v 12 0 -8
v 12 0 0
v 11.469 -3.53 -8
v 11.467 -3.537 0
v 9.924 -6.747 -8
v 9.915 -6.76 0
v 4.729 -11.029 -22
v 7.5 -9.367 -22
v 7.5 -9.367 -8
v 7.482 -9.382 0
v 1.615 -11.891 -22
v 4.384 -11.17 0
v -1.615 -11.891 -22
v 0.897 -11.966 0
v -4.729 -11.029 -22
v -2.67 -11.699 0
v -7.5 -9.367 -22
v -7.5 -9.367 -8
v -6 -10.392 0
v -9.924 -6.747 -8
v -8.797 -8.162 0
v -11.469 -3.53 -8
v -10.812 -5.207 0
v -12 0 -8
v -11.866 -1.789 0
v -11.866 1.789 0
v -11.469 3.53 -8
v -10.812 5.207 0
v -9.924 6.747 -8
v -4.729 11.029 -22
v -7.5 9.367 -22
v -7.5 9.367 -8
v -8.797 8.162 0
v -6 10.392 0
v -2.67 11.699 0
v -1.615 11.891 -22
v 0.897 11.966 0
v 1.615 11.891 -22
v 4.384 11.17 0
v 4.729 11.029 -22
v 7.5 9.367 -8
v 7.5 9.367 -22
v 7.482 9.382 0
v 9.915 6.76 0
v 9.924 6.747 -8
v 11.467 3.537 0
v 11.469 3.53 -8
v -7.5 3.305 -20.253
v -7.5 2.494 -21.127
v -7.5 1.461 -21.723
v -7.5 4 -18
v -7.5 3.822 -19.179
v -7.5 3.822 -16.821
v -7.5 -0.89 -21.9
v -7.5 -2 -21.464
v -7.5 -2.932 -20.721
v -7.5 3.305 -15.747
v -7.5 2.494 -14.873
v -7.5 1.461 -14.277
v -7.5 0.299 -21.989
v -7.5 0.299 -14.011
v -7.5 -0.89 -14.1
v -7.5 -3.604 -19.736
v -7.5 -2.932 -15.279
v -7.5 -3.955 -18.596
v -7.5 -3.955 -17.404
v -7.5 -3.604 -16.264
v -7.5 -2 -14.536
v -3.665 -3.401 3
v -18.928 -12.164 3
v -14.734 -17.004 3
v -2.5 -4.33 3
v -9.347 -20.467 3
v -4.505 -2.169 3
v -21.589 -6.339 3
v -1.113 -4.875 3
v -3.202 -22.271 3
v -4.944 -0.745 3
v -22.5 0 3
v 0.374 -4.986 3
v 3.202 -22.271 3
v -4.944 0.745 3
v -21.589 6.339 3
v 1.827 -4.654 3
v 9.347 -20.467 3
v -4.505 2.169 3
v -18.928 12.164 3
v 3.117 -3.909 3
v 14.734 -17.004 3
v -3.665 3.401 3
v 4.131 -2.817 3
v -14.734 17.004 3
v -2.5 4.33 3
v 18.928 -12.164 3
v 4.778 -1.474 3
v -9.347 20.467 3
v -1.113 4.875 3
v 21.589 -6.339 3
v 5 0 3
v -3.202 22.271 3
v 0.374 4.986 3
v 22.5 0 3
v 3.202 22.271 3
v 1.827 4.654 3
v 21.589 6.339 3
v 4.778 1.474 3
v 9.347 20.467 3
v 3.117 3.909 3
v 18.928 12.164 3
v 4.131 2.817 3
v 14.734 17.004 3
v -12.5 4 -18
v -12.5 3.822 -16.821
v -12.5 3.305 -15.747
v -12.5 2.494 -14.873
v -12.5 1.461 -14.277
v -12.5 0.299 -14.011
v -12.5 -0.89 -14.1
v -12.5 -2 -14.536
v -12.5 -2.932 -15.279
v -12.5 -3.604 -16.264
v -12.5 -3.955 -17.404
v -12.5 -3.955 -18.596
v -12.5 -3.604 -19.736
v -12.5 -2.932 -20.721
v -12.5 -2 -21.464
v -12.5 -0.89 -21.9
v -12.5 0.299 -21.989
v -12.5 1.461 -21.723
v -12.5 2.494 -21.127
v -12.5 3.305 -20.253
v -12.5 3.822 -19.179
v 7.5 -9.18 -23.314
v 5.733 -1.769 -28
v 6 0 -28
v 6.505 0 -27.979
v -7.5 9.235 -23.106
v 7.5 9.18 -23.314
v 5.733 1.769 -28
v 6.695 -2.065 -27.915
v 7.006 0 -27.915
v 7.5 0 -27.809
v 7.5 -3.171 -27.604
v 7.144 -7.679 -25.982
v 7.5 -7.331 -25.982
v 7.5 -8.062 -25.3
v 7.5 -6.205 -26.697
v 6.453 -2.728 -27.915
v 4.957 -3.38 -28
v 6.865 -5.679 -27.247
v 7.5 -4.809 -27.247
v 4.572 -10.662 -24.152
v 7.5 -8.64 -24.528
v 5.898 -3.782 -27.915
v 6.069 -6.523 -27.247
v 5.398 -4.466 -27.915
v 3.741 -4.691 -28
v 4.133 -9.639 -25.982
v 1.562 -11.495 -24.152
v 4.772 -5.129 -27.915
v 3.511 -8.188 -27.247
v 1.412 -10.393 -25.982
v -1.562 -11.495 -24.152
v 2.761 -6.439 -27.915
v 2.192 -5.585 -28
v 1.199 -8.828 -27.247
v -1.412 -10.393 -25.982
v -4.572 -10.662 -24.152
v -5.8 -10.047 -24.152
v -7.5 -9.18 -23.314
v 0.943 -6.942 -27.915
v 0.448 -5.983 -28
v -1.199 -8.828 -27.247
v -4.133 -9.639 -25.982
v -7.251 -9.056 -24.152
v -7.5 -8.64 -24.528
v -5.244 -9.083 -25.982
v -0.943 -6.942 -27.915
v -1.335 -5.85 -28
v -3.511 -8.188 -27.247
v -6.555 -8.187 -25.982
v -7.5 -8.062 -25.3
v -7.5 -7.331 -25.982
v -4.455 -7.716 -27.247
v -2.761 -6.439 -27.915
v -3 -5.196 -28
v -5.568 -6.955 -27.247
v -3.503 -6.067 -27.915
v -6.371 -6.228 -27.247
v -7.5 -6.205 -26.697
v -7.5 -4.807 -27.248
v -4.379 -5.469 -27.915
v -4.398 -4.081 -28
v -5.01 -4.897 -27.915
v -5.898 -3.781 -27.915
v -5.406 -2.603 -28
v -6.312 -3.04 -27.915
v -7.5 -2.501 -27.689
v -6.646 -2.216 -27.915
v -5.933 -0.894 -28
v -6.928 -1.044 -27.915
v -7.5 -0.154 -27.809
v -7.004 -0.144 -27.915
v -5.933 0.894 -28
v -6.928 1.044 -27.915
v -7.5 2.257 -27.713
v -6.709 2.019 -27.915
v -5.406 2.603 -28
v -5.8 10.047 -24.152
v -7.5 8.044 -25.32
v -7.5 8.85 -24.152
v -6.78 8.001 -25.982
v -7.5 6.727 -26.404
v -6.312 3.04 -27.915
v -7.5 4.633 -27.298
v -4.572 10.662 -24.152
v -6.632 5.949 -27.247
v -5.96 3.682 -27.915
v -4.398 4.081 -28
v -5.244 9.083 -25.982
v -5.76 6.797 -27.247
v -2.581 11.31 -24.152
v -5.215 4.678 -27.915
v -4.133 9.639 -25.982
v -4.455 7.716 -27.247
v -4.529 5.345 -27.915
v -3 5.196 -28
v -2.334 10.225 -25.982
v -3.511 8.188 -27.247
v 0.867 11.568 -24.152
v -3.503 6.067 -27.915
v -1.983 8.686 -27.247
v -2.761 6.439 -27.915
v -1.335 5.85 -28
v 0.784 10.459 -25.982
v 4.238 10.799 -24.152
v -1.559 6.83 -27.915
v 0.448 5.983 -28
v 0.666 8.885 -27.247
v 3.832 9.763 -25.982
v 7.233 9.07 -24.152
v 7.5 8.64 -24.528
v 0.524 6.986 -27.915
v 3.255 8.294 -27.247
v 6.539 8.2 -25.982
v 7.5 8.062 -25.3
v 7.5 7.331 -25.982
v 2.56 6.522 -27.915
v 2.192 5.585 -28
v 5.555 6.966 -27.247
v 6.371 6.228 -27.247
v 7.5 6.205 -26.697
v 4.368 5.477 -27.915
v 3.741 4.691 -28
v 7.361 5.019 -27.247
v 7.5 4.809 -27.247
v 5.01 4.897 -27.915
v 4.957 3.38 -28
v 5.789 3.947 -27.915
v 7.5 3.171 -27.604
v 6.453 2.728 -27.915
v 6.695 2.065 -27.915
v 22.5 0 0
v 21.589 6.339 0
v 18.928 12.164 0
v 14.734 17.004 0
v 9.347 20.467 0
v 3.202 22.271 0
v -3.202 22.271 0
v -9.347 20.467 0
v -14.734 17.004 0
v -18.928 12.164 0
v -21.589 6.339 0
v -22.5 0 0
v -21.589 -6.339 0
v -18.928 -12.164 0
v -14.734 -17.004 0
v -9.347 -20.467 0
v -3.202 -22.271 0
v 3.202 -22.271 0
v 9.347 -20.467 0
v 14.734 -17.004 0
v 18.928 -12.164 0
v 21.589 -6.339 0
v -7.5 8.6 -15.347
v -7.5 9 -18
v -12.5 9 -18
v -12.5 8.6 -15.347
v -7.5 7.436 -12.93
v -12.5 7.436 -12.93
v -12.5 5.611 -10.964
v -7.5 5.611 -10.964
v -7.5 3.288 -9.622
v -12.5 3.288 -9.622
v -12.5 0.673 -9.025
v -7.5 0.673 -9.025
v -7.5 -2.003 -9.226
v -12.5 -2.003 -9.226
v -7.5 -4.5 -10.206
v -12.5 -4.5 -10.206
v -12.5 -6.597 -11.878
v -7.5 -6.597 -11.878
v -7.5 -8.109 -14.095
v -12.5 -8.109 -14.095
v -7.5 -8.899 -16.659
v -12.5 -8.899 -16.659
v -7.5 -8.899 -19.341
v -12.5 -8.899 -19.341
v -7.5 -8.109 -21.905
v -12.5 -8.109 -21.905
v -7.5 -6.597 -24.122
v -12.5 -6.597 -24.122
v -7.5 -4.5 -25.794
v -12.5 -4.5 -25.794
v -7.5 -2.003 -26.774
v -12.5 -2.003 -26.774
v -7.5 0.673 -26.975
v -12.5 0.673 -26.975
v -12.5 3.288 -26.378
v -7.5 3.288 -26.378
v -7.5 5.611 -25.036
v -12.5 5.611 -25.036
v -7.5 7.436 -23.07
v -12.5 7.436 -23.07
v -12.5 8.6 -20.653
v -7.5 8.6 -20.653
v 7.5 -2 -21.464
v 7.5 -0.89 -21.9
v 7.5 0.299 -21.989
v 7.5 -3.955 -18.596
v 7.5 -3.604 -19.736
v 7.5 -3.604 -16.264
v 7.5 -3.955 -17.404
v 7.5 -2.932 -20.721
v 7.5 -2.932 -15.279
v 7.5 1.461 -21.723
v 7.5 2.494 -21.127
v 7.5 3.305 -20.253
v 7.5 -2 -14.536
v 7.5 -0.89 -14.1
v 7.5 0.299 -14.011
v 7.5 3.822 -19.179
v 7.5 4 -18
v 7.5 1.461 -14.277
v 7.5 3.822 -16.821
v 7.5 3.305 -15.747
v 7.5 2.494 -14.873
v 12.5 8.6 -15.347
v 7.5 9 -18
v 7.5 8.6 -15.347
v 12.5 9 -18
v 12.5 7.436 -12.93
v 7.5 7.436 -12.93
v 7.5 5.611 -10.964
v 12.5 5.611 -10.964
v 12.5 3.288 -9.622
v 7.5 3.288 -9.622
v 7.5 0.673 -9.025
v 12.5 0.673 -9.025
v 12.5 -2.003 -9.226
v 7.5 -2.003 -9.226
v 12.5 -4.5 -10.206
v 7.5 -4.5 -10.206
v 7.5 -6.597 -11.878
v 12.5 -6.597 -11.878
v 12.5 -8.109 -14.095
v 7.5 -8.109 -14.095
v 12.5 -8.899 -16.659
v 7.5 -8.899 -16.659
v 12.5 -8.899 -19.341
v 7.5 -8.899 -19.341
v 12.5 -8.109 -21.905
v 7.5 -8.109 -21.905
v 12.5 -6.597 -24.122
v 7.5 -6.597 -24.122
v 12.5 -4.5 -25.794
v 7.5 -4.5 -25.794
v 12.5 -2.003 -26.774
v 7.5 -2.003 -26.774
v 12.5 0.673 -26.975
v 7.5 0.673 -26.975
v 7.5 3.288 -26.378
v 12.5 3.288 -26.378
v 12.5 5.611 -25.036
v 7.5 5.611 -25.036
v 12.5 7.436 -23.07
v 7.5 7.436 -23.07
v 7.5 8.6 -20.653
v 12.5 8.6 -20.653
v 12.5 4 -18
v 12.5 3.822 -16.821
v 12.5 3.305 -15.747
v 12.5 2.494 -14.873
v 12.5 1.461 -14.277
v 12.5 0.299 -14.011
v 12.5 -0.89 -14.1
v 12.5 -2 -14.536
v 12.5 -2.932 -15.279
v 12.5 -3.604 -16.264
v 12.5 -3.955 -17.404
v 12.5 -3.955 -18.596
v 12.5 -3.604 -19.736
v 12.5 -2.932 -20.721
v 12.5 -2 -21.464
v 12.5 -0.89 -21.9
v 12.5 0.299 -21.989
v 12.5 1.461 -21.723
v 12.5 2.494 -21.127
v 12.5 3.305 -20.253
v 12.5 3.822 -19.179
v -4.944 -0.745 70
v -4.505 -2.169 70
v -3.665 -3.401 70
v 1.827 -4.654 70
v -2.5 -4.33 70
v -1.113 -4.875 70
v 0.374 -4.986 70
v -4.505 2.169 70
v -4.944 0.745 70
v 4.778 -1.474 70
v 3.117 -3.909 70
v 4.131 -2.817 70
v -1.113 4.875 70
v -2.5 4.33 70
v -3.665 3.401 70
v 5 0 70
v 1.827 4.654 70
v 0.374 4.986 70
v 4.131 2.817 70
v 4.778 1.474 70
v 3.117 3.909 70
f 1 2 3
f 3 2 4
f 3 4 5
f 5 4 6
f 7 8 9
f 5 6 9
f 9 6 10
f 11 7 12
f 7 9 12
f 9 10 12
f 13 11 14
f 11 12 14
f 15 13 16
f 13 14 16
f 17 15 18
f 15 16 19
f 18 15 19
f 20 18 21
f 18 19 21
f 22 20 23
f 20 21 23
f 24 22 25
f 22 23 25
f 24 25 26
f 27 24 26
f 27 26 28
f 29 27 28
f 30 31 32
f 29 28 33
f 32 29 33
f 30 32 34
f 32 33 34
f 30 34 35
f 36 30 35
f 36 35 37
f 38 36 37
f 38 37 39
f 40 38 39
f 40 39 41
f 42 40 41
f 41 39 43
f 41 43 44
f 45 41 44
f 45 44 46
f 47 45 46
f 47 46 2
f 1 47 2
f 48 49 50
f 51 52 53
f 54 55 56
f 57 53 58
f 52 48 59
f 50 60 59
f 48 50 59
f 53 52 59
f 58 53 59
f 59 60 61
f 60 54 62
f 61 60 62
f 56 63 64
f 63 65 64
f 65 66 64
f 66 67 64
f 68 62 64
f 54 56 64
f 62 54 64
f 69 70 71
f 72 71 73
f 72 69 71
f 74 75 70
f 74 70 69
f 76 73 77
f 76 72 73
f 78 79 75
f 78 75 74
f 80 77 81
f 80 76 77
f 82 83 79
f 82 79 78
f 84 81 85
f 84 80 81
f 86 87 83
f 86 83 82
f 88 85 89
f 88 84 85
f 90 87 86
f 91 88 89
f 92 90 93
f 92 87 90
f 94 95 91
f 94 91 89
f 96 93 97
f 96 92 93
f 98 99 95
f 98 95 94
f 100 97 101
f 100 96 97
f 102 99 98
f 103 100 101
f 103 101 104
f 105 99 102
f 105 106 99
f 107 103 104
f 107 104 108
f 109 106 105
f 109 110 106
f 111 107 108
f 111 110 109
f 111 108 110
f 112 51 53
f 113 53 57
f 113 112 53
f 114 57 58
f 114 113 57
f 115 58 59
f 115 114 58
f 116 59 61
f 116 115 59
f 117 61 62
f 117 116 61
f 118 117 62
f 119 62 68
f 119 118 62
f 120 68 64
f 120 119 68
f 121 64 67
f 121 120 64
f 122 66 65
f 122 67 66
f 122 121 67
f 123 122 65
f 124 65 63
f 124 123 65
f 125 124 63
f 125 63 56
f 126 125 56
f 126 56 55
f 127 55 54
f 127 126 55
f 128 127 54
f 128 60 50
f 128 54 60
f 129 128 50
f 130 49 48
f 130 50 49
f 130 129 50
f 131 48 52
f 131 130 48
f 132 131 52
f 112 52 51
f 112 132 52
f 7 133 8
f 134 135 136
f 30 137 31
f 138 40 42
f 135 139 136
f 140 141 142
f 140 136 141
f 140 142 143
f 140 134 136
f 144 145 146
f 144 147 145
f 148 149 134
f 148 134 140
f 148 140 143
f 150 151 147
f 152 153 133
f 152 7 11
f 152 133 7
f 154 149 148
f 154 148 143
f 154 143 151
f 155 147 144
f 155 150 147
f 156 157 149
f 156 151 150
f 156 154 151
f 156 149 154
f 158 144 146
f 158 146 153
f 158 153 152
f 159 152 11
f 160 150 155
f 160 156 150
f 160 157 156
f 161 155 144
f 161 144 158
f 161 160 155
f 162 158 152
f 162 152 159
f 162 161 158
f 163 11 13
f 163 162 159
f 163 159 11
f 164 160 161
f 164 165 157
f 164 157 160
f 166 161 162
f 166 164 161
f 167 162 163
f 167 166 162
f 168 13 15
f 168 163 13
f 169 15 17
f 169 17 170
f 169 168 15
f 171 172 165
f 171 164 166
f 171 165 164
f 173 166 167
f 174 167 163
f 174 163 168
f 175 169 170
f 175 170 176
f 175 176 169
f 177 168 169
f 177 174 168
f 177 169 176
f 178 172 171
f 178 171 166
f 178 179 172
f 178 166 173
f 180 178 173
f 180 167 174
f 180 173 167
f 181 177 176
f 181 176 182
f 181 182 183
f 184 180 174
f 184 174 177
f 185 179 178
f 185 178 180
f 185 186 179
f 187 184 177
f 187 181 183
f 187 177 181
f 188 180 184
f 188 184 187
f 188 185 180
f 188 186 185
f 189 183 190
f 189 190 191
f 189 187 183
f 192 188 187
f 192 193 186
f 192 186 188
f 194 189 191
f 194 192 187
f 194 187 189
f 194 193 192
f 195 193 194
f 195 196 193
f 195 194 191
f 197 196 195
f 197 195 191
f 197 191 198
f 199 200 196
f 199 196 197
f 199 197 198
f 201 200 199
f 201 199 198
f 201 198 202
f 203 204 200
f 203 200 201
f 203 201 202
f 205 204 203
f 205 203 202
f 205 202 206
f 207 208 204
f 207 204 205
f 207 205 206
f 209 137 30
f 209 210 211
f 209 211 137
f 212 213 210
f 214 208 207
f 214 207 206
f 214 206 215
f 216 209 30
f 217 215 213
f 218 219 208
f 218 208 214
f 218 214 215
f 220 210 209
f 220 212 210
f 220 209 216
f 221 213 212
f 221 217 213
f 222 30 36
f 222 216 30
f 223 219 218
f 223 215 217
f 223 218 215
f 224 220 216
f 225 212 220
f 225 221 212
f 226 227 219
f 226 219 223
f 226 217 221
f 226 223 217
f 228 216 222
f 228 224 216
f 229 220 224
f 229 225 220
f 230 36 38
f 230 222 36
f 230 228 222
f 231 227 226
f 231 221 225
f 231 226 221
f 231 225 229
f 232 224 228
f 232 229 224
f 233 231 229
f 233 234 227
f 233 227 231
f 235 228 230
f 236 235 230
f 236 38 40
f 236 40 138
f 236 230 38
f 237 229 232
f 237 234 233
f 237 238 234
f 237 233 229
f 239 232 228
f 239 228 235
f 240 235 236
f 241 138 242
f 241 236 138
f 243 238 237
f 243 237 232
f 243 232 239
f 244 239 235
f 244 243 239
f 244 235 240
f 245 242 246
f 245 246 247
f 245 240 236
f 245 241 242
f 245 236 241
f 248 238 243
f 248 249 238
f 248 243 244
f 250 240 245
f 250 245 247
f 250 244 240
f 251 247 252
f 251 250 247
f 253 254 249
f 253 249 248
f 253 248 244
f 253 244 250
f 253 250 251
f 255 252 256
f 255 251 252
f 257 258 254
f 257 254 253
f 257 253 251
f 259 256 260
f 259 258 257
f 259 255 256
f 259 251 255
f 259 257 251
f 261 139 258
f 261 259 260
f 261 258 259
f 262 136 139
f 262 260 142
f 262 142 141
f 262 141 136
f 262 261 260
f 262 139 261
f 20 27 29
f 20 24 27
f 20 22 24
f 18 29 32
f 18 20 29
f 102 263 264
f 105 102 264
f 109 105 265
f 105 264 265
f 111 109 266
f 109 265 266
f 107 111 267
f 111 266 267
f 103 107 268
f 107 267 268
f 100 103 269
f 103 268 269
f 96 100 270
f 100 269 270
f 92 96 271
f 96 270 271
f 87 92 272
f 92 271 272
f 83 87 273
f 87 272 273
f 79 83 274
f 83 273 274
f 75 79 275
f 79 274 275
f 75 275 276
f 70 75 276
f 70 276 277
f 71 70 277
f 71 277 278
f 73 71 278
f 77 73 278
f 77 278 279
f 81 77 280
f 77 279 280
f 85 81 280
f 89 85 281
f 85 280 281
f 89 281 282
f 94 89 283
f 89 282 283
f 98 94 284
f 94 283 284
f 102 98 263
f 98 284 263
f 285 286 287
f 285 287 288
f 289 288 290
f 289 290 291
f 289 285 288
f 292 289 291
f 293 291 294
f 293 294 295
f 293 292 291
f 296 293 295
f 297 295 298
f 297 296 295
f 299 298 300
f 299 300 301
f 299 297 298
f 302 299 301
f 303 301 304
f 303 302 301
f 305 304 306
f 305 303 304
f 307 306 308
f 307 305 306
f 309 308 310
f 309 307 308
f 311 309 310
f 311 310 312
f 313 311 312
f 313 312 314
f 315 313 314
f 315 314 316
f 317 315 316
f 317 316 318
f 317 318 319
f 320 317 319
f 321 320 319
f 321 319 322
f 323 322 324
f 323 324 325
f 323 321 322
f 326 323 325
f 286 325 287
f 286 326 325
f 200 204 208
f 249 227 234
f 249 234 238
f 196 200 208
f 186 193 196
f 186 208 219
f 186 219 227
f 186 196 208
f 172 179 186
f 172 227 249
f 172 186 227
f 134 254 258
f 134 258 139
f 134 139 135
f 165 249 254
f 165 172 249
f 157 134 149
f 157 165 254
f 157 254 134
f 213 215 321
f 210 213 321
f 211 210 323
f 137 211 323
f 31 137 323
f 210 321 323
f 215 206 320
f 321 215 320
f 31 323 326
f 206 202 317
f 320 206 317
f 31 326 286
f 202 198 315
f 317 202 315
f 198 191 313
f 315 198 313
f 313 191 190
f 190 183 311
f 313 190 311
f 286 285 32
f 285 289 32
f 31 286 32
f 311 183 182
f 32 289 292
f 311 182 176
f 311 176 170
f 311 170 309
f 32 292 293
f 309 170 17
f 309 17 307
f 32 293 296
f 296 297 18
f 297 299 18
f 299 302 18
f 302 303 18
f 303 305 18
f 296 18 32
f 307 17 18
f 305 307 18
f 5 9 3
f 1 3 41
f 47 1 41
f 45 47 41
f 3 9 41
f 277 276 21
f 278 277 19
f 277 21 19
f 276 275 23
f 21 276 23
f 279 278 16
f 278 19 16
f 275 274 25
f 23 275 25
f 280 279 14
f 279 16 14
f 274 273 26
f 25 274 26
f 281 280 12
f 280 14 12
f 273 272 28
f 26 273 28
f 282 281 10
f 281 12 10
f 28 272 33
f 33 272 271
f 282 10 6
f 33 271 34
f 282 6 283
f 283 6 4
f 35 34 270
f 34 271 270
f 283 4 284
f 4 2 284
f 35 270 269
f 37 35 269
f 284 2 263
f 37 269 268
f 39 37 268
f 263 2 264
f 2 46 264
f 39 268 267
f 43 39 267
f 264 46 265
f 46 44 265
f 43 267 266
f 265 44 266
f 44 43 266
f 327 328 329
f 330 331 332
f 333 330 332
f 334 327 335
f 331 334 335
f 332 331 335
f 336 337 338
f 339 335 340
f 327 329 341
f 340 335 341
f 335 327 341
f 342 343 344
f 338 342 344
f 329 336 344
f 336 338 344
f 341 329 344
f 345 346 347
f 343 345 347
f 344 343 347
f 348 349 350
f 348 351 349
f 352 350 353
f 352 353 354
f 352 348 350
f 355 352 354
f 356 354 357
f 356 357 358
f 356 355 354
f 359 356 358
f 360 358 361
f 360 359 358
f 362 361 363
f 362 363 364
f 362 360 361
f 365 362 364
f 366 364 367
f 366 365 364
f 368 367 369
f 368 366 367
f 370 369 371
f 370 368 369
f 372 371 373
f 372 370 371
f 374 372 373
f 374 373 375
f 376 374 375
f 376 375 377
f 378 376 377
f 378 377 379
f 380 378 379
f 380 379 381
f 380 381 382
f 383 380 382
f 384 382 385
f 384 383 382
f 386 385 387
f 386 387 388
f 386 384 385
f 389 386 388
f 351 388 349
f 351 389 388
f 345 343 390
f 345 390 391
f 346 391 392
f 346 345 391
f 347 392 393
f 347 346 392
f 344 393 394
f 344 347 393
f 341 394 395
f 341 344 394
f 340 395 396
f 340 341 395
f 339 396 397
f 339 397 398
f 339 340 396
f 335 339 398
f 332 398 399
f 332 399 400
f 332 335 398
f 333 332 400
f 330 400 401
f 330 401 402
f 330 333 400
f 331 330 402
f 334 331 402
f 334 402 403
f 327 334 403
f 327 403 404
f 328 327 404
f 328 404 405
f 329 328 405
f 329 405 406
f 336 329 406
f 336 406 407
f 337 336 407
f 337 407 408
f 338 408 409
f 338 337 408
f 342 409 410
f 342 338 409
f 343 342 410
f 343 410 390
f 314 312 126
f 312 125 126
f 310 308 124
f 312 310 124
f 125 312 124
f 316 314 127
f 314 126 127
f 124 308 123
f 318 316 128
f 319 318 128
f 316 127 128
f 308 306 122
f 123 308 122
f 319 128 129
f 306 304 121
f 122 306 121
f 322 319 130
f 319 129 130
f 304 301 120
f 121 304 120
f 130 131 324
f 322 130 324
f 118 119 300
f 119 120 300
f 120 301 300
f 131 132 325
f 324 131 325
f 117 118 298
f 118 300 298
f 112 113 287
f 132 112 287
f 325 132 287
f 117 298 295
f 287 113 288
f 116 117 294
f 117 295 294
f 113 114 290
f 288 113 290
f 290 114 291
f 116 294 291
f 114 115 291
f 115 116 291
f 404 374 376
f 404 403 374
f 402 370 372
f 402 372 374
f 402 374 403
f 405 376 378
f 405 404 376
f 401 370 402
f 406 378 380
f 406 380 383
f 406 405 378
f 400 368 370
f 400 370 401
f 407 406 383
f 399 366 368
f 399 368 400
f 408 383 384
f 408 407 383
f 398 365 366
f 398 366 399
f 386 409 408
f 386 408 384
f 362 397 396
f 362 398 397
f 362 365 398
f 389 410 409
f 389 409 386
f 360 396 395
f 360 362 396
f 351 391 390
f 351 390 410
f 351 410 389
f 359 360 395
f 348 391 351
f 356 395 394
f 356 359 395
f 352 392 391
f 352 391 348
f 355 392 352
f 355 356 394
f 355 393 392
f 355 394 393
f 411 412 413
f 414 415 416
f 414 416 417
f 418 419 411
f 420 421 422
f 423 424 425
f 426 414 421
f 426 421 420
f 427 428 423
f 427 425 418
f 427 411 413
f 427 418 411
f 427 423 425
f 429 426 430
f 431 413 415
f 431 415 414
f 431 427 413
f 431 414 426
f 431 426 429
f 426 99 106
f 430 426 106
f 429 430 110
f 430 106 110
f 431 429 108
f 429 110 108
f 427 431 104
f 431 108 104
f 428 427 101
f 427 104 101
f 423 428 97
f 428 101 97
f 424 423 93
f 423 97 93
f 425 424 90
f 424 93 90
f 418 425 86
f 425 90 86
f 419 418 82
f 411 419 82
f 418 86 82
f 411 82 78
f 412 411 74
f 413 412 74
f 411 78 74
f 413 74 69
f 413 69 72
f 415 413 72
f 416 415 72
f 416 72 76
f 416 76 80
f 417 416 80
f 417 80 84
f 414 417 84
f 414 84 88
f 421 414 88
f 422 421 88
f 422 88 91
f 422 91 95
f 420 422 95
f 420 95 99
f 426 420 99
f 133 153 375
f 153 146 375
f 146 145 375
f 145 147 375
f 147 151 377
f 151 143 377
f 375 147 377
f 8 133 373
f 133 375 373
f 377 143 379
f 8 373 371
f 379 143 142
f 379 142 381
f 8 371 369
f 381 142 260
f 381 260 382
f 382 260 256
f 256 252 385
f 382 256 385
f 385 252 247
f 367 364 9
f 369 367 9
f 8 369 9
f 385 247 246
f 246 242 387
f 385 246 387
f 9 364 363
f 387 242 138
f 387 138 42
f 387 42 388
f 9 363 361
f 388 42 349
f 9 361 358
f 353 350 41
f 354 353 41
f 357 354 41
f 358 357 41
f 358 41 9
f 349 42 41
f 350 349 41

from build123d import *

# Parameters (mm, degrees)
F0_R      = 22.5
F1_DEPTH  = 3
F2_R      = 5
F3_DEPTH  = 70
F4_R      = 12
F5_DEPTH  = 28
F6_R      = 6
F7_W      = 19.57
F7_H      = 20
F8_DEPTH  = 12.5
F9_R      = 9
F9_R_2    = 4
F10_DEPTH = 12.5


with BuildPart() as f1:
    # F0 (on Top) → F1 (new body)
    with BuildSketch(Plane.XY):
        Circle(F0_R)
    extrude(amount=F1_DEPTH)

    # F2 (on Top) → F3 (join)
    with BuildSketch(Plane.XY):
        Circle(F2_R)
    extrude(amount=F3_DEPTH)

    # F4 (on face) → F5 (join)
    with BuildSketch(Plane(origin=(0, 0, 0), x_dir=(1, 0, 0), z_dir=(0, 0, -1))):
        Circle(F4_R)
    extrude(amount=F5_DEPTH)

    # F6
    f6_edges = [f1.edges().sort_by_distance(p)[0] for p in [
        (-12, 0, -28),
    ]]
    fillet(f6_edges, radius=F6_R)

    # F7 (on Front) → F8 (cut, symmetric)
    with BuildSketch(Plane.XZ):
        with Locations((17.285, -18)):
            Rectangle(F7_W, F7_H)
        with Locations((-17.285, -18)):
            Rectangle(F7_W, F7_H)
    extrude(amount=F8_DEPTH, both=True, mode=Mode.SUBTRACT)

    # F9 (on Right) → F10 (join, symmetric)
    with BuildSketch(Plane.YZ):
        with Locations((0, -18)):
            Circle(F9_R)
        with Locations((0, -18)):
            Circle(F9_R_2, mode=Mode.SUBTRACT)
    extrude(amount=F10_DEPTH, both=True)


solid = f1.part
